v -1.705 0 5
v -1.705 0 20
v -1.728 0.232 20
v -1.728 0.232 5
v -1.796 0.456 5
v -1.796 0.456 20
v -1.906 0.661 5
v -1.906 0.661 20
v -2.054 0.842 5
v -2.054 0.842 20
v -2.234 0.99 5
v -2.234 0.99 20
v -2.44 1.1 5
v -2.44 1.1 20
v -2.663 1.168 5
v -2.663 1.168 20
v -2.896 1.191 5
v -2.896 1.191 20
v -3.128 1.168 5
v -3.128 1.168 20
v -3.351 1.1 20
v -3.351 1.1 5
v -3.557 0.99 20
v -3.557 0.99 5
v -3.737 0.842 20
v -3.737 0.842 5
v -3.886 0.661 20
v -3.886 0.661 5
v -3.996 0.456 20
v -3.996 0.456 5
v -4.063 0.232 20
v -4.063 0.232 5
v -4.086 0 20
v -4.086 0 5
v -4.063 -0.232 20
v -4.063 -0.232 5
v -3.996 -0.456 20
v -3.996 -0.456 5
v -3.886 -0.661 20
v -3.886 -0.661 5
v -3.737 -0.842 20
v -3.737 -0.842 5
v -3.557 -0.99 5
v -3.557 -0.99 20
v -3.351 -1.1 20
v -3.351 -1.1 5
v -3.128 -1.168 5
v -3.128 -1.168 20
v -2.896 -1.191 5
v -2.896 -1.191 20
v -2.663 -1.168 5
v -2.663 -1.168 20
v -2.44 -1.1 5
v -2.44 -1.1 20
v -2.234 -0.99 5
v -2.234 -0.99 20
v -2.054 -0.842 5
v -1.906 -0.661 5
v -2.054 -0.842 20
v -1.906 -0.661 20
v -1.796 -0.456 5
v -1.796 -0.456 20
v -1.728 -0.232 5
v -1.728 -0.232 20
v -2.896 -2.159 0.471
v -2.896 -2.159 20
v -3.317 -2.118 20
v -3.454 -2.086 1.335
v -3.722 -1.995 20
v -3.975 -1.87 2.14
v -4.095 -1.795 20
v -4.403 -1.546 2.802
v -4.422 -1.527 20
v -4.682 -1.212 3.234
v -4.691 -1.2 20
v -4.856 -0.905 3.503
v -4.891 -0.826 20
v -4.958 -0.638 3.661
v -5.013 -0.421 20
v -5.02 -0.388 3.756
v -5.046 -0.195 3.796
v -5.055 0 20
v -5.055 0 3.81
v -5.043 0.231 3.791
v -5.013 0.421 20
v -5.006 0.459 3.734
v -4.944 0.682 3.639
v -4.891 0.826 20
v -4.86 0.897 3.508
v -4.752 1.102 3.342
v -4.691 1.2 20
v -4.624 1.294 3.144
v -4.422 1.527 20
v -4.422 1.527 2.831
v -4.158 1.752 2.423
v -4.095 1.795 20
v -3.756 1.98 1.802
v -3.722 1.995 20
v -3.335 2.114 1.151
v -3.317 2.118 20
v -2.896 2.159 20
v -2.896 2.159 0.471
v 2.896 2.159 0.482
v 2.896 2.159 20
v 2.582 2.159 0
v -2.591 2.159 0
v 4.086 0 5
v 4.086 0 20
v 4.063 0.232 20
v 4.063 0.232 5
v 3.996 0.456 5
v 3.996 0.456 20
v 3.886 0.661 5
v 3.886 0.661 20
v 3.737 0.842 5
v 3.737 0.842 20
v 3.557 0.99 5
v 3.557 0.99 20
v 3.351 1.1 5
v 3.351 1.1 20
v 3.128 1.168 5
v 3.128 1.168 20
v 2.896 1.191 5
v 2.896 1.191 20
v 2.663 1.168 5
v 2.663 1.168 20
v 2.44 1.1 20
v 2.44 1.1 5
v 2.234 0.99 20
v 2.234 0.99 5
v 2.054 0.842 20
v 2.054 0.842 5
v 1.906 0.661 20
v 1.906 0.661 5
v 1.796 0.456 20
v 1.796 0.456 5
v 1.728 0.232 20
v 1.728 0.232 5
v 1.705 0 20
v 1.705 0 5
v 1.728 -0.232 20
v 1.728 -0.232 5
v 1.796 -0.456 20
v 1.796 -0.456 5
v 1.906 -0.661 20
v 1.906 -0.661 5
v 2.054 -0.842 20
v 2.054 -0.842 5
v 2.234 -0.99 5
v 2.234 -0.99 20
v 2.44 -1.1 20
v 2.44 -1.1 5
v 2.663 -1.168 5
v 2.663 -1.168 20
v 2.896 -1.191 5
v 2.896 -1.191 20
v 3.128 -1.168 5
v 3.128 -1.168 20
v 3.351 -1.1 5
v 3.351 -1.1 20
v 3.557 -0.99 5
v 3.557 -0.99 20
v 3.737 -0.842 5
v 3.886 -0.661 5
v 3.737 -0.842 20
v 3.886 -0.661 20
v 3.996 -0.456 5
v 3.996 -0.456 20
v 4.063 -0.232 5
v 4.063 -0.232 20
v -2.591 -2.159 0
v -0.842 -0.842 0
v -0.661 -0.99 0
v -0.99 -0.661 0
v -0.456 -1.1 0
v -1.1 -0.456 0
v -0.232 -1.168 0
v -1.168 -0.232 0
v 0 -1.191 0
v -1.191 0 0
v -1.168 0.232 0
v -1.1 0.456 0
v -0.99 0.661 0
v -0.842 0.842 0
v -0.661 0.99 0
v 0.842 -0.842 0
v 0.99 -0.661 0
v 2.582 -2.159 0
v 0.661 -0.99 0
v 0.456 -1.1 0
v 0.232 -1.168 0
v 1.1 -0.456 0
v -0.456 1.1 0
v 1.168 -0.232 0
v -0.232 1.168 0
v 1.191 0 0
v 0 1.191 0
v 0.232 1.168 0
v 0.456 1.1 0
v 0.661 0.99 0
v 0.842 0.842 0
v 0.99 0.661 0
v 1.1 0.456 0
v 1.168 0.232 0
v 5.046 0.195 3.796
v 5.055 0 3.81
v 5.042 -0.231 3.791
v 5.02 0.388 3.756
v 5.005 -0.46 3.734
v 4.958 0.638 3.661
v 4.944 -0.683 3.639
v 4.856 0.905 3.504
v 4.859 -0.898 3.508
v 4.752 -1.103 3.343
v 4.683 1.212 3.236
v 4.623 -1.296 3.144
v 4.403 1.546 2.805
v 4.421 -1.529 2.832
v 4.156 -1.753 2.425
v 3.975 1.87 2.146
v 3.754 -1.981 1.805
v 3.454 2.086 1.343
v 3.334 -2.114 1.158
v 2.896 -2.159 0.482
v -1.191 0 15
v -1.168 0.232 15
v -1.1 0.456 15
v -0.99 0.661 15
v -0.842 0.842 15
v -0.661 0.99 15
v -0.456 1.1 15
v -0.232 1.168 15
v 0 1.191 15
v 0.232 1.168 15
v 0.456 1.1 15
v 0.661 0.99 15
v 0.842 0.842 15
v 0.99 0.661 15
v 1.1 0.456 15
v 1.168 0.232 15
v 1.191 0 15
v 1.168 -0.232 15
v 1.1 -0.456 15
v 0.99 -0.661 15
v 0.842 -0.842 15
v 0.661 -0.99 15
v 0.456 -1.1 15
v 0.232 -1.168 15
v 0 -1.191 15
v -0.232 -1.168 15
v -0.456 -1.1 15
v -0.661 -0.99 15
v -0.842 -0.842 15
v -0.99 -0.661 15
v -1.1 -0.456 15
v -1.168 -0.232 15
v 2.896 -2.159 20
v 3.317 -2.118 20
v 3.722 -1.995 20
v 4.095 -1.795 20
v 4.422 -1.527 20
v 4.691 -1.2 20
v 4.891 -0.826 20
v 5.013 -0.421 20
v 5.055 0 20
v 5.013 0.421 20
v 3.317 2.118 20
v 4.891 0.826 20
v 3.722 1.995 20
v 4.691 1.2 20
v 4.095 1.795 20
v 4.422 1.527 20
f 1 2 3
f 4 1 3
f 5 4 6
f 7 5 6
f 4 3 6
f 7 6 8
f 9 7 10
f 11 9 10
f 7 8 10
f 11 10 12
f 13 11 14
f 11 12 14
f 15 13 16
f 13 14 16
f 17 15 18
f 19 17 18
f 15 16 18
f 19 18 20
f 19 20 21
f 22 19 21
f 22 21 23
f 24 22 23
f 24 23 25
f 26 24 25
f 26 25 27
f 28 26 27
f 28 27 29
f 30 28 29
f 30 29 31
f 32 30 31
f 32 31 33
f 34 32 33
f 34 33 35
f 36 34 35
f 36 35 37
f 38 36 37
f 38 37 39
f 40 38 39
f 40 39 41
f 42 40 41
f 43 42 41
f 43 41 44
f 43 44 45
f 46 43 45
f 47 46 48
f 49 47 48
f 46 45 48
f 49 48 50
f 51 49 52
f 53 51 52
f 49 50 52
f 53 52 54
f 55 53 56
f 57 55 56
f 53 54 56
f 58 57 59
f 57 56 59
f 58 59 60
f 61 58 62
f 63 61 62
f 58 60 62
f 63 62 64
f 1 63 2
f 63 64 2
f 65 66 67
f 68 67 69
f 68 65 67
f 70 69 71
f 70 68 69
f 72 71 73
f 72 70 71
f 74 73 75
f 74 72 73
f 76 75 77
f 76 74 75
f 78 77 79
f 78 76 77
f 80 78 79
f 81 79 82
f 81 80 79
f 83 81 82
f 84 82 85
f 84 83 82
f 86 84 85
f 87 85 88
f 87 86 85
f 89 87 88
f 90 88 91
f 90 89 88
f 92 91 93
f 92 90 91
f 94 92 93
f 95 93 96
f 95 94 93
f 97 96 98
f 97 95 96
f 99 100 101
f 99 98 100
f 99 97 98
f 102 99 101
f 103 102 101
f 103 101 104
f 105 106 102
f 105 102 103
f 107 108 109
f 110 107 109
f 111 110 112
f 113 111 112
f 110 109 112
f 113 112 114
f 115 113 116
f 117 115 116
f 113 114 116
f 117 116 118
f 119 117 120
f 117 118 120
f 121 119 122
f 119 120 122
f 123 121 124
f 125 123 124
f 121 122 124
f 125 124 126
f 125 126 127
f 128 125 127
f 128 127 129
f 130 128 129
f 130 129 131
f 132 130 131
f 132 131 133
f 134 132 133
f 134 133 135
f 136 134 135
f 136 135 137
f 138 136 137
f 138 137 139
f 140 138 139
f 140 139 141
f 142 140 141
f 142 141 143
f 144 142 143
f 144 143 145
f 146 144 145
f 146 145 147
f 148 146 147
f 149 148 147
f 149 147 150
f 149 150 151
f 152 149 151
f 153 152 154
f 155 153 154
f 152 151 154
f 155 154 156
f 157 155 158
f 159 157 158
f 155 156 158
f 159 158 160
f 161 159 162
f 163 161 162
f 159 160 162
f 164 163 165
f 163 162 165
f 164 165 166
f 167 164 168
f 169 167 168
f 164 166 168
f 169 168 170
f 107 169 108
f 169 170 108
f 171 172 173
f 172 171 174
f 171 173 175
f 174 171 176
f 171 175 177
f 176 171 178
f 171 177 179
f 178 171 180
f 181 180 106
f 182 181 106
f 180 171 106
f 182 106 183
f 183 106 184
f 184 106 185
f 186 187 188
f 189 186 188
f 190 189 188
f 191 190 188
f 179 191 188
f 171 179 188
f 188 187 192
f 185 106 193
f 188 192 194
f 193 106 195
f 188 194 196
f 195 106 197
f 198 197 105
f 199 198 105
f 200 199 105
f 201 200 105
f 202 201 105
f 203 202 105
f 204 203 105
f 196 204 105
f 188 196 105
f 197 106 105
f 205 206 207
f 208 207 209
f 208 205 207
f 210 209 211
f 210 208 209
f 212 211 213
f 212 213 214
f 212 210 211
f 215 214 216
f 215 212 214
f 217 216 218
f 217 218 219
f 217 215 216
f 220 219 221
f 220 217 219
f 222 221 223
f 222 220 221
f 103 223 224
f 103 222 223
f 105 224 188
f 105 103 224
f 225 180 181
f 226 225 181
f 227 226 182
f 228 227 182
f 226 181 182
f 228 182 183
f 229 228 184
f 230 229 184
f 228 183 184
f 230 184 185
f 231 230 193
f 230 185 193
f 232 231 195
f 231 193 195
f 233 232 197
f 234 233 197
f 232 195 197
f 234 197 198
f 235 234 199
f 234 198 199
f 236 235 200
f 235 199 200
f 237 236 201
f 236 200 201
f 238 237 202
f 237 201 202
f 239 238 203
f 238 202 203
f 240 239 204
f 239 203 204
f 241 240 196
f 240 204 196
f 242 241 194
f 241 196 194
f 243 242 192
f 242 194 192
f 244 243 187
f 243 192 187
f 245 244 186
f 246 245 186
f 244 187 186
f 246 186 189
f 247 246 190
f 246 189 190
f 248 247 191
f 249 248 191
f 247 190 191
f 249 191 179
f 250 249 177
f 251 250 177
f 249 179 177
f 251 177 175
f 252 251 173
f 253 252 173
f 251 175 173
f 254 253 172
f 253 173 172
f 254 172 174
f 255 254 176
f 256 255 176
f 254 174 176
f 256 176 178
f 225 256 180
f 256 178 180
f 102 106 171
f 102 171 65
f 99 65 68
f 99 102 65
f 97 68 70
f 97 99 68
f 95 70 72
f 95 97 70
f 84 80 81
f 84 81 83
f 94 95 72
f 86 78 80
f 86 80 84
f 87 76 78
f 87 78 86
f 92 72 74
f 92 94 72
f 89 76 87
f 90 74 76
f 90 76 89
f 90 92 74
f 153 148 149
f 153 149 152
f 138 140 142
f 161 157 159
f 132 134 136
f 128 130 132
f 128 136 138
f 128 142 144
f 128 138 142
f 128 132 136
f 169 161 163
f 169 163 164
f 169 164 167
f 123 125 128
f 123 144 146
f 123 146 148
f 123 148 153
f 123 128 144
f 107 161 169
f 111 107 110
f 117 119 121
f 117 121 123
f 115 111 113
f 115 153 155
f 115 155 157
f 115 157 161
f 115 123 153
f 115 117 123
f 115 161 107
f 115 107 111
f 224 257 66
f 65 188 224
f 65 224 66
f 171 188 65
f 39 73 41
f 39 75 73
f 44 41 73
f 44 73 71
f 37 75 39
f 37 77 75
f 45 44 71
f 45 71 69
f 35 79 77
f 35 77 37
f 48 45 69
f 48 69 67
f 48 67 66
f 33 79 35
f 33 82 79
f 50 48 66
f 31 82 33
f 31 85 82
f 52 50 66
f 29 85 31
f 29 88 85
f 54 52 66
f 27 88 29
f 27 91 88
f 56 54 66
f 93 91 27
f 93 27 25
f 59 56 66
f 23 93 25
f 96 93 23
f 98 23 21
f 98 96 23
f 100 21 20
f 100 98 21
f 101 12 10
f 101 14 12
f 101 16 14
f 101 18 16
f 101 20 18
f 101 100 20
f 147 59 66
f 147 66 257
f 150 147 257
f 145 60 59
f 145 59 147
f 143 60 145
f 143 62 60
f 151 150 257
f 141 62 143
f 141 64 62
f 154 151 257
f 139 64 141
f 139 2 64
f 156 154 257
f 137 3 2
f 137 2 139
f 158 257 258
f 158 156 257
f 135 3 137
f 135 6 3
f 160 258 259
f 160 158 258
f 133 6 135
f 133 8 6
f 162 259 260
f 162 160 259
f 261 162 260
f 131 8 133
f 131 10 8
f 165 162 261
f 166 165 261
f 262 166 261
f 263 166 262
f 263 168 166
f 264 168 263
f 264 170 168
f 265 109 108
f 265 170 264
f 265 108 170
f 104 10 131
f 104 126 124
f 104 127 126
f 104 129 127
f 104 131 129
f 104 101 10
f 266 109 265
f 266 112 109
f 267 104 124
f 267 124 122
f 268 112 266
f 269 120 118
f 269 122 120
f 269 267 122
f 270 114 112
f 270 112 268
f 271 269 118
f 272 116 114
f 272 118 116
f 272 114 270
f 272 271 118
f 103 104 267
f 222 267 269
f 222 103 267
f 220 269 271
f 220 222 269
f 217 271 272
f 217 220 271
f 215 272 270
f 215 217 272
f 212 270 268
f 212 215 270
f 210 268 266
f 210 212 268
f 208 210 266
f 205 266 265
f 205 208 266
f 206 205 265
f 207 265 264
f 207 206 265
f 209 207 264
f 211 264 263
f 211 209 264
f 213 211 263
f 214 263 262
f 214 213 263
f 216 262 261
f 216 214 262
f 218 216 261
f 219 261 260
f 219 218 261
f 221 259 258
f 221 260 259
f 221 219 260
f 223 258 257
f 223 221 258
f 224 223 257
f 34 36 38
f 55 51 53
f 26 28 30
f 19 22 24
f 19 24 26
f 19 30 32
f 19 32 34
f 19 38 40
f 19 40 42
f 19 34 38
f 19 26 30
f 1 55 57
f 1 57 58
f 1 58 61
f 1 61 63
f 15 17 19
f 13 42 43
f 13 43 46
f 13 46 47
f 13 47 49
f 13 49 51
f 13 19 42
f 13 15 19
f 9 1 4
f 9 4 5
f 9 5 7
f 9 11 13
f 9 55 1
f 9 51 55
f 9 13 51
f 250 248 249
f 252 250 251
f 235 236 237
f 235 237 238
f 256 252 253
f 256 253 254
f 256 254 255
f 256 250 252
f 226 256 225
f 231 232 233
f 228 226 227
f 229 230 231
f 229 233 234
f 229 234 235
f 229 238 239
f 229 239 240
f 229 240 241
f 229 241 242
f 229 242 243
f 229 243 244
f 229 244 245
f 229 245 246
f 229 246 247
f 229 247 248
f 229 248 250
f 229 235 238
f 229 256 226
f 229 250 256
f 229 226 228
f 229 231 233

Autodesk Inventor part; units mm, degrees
ref_plane "YZ Plane" through (0, 0, 0) normal (1, 0, 0) x (0, 1, 0)
ref_plane "XZ Plane" through (0, 0, 0) normal (0, 1, 0) x (-1, 0, 0)
ref_plane "XY Plane" through (0, 0, 0) normal (0, 0, 1) x (1, 0, 0)
sketch "Sketch5" plane through (0, 0, 0) normal (0, 0, 1) x (1, 0, 0)
  line L0 (-2.8956, 2.1593) -> (2.8956, 2.1593)
  arc A0 (2.8956, -2.1593) -> (2.8956, 2.1593) centre (2.8956, 0) ccw
  line L1 (2.8956, -2.1593) -> (-2.8956, -2.1593)
  arc A1 (-2.8956, 2.1593) -> (-2.8956, -2.1593) centre (-2.8956, 0) ccw
  point P0 (0, 0)
  dimension "d44" = 2.8956
  dimension "d45" = 2.8956
extrude "Extrusion1" add sketch "Sketch5" along normal blind 20
sketch "Sketch6" plane through (0, 0, 20) normal (0, 0, 1) x (1, 0, 0)
  circle A0 centre (2.8956, 0) radius 1.1906
  circle A1 centre (-2.8956, 0) radius 1.1906
  point P0 (0, 0)
  dimension "d28" = 2.3813
  dimension "d29" = 2.8956
  dimension "d30" = 2.8956
  dimension "d31" = 2.3813
extrude "Extrusion2" cut sketch "Sketch6" against normal blind 15
sketch "Sketch7" plane through (0, 0, 0) normal (0, 0, -1) x (-1, 0, 0)
  circle A0 centre (0, 0) radius 1.1906
  dimension "d34" = 2.3813
extrude "Extrusion3" cut sketch "Sketch7" against normal blind 15
sketch "Sketch8" plane through (-2.8956, 2.1593, 0) normal (0, 1, 0) x (1, 0, 0)
  line L0 (7.9505, 0) -> (7.9505, -20) projected
  line L1 (7.9505, -3.81) -> (5.4781, 0)
  line L2 (0, 0) -> (5.7912, 0) projected
  line L3 (0.3048, 0) -> (-2.1593, -3.81)
  line L4 (-2.1593, 0) -> (-2.1593, -20) projected
  line L5 (5.4781, 0) -> (7.9505, 0)
  line L6 (0.3048, 0) -> (-2.1593, 0)
  line L7 (5.7912, 0) -> (0, 0) projected
  point P0 (2.8956, 0)
  dimension "d37" = 2.5825
  dimension "d38" = 2.5908
  dimension "d39" = 3.81
  dimension "d40" = 3.81
extrude "Extrusion4" cut sketch "Sketch8" against normal blind 15
properties part number "Splitter"
